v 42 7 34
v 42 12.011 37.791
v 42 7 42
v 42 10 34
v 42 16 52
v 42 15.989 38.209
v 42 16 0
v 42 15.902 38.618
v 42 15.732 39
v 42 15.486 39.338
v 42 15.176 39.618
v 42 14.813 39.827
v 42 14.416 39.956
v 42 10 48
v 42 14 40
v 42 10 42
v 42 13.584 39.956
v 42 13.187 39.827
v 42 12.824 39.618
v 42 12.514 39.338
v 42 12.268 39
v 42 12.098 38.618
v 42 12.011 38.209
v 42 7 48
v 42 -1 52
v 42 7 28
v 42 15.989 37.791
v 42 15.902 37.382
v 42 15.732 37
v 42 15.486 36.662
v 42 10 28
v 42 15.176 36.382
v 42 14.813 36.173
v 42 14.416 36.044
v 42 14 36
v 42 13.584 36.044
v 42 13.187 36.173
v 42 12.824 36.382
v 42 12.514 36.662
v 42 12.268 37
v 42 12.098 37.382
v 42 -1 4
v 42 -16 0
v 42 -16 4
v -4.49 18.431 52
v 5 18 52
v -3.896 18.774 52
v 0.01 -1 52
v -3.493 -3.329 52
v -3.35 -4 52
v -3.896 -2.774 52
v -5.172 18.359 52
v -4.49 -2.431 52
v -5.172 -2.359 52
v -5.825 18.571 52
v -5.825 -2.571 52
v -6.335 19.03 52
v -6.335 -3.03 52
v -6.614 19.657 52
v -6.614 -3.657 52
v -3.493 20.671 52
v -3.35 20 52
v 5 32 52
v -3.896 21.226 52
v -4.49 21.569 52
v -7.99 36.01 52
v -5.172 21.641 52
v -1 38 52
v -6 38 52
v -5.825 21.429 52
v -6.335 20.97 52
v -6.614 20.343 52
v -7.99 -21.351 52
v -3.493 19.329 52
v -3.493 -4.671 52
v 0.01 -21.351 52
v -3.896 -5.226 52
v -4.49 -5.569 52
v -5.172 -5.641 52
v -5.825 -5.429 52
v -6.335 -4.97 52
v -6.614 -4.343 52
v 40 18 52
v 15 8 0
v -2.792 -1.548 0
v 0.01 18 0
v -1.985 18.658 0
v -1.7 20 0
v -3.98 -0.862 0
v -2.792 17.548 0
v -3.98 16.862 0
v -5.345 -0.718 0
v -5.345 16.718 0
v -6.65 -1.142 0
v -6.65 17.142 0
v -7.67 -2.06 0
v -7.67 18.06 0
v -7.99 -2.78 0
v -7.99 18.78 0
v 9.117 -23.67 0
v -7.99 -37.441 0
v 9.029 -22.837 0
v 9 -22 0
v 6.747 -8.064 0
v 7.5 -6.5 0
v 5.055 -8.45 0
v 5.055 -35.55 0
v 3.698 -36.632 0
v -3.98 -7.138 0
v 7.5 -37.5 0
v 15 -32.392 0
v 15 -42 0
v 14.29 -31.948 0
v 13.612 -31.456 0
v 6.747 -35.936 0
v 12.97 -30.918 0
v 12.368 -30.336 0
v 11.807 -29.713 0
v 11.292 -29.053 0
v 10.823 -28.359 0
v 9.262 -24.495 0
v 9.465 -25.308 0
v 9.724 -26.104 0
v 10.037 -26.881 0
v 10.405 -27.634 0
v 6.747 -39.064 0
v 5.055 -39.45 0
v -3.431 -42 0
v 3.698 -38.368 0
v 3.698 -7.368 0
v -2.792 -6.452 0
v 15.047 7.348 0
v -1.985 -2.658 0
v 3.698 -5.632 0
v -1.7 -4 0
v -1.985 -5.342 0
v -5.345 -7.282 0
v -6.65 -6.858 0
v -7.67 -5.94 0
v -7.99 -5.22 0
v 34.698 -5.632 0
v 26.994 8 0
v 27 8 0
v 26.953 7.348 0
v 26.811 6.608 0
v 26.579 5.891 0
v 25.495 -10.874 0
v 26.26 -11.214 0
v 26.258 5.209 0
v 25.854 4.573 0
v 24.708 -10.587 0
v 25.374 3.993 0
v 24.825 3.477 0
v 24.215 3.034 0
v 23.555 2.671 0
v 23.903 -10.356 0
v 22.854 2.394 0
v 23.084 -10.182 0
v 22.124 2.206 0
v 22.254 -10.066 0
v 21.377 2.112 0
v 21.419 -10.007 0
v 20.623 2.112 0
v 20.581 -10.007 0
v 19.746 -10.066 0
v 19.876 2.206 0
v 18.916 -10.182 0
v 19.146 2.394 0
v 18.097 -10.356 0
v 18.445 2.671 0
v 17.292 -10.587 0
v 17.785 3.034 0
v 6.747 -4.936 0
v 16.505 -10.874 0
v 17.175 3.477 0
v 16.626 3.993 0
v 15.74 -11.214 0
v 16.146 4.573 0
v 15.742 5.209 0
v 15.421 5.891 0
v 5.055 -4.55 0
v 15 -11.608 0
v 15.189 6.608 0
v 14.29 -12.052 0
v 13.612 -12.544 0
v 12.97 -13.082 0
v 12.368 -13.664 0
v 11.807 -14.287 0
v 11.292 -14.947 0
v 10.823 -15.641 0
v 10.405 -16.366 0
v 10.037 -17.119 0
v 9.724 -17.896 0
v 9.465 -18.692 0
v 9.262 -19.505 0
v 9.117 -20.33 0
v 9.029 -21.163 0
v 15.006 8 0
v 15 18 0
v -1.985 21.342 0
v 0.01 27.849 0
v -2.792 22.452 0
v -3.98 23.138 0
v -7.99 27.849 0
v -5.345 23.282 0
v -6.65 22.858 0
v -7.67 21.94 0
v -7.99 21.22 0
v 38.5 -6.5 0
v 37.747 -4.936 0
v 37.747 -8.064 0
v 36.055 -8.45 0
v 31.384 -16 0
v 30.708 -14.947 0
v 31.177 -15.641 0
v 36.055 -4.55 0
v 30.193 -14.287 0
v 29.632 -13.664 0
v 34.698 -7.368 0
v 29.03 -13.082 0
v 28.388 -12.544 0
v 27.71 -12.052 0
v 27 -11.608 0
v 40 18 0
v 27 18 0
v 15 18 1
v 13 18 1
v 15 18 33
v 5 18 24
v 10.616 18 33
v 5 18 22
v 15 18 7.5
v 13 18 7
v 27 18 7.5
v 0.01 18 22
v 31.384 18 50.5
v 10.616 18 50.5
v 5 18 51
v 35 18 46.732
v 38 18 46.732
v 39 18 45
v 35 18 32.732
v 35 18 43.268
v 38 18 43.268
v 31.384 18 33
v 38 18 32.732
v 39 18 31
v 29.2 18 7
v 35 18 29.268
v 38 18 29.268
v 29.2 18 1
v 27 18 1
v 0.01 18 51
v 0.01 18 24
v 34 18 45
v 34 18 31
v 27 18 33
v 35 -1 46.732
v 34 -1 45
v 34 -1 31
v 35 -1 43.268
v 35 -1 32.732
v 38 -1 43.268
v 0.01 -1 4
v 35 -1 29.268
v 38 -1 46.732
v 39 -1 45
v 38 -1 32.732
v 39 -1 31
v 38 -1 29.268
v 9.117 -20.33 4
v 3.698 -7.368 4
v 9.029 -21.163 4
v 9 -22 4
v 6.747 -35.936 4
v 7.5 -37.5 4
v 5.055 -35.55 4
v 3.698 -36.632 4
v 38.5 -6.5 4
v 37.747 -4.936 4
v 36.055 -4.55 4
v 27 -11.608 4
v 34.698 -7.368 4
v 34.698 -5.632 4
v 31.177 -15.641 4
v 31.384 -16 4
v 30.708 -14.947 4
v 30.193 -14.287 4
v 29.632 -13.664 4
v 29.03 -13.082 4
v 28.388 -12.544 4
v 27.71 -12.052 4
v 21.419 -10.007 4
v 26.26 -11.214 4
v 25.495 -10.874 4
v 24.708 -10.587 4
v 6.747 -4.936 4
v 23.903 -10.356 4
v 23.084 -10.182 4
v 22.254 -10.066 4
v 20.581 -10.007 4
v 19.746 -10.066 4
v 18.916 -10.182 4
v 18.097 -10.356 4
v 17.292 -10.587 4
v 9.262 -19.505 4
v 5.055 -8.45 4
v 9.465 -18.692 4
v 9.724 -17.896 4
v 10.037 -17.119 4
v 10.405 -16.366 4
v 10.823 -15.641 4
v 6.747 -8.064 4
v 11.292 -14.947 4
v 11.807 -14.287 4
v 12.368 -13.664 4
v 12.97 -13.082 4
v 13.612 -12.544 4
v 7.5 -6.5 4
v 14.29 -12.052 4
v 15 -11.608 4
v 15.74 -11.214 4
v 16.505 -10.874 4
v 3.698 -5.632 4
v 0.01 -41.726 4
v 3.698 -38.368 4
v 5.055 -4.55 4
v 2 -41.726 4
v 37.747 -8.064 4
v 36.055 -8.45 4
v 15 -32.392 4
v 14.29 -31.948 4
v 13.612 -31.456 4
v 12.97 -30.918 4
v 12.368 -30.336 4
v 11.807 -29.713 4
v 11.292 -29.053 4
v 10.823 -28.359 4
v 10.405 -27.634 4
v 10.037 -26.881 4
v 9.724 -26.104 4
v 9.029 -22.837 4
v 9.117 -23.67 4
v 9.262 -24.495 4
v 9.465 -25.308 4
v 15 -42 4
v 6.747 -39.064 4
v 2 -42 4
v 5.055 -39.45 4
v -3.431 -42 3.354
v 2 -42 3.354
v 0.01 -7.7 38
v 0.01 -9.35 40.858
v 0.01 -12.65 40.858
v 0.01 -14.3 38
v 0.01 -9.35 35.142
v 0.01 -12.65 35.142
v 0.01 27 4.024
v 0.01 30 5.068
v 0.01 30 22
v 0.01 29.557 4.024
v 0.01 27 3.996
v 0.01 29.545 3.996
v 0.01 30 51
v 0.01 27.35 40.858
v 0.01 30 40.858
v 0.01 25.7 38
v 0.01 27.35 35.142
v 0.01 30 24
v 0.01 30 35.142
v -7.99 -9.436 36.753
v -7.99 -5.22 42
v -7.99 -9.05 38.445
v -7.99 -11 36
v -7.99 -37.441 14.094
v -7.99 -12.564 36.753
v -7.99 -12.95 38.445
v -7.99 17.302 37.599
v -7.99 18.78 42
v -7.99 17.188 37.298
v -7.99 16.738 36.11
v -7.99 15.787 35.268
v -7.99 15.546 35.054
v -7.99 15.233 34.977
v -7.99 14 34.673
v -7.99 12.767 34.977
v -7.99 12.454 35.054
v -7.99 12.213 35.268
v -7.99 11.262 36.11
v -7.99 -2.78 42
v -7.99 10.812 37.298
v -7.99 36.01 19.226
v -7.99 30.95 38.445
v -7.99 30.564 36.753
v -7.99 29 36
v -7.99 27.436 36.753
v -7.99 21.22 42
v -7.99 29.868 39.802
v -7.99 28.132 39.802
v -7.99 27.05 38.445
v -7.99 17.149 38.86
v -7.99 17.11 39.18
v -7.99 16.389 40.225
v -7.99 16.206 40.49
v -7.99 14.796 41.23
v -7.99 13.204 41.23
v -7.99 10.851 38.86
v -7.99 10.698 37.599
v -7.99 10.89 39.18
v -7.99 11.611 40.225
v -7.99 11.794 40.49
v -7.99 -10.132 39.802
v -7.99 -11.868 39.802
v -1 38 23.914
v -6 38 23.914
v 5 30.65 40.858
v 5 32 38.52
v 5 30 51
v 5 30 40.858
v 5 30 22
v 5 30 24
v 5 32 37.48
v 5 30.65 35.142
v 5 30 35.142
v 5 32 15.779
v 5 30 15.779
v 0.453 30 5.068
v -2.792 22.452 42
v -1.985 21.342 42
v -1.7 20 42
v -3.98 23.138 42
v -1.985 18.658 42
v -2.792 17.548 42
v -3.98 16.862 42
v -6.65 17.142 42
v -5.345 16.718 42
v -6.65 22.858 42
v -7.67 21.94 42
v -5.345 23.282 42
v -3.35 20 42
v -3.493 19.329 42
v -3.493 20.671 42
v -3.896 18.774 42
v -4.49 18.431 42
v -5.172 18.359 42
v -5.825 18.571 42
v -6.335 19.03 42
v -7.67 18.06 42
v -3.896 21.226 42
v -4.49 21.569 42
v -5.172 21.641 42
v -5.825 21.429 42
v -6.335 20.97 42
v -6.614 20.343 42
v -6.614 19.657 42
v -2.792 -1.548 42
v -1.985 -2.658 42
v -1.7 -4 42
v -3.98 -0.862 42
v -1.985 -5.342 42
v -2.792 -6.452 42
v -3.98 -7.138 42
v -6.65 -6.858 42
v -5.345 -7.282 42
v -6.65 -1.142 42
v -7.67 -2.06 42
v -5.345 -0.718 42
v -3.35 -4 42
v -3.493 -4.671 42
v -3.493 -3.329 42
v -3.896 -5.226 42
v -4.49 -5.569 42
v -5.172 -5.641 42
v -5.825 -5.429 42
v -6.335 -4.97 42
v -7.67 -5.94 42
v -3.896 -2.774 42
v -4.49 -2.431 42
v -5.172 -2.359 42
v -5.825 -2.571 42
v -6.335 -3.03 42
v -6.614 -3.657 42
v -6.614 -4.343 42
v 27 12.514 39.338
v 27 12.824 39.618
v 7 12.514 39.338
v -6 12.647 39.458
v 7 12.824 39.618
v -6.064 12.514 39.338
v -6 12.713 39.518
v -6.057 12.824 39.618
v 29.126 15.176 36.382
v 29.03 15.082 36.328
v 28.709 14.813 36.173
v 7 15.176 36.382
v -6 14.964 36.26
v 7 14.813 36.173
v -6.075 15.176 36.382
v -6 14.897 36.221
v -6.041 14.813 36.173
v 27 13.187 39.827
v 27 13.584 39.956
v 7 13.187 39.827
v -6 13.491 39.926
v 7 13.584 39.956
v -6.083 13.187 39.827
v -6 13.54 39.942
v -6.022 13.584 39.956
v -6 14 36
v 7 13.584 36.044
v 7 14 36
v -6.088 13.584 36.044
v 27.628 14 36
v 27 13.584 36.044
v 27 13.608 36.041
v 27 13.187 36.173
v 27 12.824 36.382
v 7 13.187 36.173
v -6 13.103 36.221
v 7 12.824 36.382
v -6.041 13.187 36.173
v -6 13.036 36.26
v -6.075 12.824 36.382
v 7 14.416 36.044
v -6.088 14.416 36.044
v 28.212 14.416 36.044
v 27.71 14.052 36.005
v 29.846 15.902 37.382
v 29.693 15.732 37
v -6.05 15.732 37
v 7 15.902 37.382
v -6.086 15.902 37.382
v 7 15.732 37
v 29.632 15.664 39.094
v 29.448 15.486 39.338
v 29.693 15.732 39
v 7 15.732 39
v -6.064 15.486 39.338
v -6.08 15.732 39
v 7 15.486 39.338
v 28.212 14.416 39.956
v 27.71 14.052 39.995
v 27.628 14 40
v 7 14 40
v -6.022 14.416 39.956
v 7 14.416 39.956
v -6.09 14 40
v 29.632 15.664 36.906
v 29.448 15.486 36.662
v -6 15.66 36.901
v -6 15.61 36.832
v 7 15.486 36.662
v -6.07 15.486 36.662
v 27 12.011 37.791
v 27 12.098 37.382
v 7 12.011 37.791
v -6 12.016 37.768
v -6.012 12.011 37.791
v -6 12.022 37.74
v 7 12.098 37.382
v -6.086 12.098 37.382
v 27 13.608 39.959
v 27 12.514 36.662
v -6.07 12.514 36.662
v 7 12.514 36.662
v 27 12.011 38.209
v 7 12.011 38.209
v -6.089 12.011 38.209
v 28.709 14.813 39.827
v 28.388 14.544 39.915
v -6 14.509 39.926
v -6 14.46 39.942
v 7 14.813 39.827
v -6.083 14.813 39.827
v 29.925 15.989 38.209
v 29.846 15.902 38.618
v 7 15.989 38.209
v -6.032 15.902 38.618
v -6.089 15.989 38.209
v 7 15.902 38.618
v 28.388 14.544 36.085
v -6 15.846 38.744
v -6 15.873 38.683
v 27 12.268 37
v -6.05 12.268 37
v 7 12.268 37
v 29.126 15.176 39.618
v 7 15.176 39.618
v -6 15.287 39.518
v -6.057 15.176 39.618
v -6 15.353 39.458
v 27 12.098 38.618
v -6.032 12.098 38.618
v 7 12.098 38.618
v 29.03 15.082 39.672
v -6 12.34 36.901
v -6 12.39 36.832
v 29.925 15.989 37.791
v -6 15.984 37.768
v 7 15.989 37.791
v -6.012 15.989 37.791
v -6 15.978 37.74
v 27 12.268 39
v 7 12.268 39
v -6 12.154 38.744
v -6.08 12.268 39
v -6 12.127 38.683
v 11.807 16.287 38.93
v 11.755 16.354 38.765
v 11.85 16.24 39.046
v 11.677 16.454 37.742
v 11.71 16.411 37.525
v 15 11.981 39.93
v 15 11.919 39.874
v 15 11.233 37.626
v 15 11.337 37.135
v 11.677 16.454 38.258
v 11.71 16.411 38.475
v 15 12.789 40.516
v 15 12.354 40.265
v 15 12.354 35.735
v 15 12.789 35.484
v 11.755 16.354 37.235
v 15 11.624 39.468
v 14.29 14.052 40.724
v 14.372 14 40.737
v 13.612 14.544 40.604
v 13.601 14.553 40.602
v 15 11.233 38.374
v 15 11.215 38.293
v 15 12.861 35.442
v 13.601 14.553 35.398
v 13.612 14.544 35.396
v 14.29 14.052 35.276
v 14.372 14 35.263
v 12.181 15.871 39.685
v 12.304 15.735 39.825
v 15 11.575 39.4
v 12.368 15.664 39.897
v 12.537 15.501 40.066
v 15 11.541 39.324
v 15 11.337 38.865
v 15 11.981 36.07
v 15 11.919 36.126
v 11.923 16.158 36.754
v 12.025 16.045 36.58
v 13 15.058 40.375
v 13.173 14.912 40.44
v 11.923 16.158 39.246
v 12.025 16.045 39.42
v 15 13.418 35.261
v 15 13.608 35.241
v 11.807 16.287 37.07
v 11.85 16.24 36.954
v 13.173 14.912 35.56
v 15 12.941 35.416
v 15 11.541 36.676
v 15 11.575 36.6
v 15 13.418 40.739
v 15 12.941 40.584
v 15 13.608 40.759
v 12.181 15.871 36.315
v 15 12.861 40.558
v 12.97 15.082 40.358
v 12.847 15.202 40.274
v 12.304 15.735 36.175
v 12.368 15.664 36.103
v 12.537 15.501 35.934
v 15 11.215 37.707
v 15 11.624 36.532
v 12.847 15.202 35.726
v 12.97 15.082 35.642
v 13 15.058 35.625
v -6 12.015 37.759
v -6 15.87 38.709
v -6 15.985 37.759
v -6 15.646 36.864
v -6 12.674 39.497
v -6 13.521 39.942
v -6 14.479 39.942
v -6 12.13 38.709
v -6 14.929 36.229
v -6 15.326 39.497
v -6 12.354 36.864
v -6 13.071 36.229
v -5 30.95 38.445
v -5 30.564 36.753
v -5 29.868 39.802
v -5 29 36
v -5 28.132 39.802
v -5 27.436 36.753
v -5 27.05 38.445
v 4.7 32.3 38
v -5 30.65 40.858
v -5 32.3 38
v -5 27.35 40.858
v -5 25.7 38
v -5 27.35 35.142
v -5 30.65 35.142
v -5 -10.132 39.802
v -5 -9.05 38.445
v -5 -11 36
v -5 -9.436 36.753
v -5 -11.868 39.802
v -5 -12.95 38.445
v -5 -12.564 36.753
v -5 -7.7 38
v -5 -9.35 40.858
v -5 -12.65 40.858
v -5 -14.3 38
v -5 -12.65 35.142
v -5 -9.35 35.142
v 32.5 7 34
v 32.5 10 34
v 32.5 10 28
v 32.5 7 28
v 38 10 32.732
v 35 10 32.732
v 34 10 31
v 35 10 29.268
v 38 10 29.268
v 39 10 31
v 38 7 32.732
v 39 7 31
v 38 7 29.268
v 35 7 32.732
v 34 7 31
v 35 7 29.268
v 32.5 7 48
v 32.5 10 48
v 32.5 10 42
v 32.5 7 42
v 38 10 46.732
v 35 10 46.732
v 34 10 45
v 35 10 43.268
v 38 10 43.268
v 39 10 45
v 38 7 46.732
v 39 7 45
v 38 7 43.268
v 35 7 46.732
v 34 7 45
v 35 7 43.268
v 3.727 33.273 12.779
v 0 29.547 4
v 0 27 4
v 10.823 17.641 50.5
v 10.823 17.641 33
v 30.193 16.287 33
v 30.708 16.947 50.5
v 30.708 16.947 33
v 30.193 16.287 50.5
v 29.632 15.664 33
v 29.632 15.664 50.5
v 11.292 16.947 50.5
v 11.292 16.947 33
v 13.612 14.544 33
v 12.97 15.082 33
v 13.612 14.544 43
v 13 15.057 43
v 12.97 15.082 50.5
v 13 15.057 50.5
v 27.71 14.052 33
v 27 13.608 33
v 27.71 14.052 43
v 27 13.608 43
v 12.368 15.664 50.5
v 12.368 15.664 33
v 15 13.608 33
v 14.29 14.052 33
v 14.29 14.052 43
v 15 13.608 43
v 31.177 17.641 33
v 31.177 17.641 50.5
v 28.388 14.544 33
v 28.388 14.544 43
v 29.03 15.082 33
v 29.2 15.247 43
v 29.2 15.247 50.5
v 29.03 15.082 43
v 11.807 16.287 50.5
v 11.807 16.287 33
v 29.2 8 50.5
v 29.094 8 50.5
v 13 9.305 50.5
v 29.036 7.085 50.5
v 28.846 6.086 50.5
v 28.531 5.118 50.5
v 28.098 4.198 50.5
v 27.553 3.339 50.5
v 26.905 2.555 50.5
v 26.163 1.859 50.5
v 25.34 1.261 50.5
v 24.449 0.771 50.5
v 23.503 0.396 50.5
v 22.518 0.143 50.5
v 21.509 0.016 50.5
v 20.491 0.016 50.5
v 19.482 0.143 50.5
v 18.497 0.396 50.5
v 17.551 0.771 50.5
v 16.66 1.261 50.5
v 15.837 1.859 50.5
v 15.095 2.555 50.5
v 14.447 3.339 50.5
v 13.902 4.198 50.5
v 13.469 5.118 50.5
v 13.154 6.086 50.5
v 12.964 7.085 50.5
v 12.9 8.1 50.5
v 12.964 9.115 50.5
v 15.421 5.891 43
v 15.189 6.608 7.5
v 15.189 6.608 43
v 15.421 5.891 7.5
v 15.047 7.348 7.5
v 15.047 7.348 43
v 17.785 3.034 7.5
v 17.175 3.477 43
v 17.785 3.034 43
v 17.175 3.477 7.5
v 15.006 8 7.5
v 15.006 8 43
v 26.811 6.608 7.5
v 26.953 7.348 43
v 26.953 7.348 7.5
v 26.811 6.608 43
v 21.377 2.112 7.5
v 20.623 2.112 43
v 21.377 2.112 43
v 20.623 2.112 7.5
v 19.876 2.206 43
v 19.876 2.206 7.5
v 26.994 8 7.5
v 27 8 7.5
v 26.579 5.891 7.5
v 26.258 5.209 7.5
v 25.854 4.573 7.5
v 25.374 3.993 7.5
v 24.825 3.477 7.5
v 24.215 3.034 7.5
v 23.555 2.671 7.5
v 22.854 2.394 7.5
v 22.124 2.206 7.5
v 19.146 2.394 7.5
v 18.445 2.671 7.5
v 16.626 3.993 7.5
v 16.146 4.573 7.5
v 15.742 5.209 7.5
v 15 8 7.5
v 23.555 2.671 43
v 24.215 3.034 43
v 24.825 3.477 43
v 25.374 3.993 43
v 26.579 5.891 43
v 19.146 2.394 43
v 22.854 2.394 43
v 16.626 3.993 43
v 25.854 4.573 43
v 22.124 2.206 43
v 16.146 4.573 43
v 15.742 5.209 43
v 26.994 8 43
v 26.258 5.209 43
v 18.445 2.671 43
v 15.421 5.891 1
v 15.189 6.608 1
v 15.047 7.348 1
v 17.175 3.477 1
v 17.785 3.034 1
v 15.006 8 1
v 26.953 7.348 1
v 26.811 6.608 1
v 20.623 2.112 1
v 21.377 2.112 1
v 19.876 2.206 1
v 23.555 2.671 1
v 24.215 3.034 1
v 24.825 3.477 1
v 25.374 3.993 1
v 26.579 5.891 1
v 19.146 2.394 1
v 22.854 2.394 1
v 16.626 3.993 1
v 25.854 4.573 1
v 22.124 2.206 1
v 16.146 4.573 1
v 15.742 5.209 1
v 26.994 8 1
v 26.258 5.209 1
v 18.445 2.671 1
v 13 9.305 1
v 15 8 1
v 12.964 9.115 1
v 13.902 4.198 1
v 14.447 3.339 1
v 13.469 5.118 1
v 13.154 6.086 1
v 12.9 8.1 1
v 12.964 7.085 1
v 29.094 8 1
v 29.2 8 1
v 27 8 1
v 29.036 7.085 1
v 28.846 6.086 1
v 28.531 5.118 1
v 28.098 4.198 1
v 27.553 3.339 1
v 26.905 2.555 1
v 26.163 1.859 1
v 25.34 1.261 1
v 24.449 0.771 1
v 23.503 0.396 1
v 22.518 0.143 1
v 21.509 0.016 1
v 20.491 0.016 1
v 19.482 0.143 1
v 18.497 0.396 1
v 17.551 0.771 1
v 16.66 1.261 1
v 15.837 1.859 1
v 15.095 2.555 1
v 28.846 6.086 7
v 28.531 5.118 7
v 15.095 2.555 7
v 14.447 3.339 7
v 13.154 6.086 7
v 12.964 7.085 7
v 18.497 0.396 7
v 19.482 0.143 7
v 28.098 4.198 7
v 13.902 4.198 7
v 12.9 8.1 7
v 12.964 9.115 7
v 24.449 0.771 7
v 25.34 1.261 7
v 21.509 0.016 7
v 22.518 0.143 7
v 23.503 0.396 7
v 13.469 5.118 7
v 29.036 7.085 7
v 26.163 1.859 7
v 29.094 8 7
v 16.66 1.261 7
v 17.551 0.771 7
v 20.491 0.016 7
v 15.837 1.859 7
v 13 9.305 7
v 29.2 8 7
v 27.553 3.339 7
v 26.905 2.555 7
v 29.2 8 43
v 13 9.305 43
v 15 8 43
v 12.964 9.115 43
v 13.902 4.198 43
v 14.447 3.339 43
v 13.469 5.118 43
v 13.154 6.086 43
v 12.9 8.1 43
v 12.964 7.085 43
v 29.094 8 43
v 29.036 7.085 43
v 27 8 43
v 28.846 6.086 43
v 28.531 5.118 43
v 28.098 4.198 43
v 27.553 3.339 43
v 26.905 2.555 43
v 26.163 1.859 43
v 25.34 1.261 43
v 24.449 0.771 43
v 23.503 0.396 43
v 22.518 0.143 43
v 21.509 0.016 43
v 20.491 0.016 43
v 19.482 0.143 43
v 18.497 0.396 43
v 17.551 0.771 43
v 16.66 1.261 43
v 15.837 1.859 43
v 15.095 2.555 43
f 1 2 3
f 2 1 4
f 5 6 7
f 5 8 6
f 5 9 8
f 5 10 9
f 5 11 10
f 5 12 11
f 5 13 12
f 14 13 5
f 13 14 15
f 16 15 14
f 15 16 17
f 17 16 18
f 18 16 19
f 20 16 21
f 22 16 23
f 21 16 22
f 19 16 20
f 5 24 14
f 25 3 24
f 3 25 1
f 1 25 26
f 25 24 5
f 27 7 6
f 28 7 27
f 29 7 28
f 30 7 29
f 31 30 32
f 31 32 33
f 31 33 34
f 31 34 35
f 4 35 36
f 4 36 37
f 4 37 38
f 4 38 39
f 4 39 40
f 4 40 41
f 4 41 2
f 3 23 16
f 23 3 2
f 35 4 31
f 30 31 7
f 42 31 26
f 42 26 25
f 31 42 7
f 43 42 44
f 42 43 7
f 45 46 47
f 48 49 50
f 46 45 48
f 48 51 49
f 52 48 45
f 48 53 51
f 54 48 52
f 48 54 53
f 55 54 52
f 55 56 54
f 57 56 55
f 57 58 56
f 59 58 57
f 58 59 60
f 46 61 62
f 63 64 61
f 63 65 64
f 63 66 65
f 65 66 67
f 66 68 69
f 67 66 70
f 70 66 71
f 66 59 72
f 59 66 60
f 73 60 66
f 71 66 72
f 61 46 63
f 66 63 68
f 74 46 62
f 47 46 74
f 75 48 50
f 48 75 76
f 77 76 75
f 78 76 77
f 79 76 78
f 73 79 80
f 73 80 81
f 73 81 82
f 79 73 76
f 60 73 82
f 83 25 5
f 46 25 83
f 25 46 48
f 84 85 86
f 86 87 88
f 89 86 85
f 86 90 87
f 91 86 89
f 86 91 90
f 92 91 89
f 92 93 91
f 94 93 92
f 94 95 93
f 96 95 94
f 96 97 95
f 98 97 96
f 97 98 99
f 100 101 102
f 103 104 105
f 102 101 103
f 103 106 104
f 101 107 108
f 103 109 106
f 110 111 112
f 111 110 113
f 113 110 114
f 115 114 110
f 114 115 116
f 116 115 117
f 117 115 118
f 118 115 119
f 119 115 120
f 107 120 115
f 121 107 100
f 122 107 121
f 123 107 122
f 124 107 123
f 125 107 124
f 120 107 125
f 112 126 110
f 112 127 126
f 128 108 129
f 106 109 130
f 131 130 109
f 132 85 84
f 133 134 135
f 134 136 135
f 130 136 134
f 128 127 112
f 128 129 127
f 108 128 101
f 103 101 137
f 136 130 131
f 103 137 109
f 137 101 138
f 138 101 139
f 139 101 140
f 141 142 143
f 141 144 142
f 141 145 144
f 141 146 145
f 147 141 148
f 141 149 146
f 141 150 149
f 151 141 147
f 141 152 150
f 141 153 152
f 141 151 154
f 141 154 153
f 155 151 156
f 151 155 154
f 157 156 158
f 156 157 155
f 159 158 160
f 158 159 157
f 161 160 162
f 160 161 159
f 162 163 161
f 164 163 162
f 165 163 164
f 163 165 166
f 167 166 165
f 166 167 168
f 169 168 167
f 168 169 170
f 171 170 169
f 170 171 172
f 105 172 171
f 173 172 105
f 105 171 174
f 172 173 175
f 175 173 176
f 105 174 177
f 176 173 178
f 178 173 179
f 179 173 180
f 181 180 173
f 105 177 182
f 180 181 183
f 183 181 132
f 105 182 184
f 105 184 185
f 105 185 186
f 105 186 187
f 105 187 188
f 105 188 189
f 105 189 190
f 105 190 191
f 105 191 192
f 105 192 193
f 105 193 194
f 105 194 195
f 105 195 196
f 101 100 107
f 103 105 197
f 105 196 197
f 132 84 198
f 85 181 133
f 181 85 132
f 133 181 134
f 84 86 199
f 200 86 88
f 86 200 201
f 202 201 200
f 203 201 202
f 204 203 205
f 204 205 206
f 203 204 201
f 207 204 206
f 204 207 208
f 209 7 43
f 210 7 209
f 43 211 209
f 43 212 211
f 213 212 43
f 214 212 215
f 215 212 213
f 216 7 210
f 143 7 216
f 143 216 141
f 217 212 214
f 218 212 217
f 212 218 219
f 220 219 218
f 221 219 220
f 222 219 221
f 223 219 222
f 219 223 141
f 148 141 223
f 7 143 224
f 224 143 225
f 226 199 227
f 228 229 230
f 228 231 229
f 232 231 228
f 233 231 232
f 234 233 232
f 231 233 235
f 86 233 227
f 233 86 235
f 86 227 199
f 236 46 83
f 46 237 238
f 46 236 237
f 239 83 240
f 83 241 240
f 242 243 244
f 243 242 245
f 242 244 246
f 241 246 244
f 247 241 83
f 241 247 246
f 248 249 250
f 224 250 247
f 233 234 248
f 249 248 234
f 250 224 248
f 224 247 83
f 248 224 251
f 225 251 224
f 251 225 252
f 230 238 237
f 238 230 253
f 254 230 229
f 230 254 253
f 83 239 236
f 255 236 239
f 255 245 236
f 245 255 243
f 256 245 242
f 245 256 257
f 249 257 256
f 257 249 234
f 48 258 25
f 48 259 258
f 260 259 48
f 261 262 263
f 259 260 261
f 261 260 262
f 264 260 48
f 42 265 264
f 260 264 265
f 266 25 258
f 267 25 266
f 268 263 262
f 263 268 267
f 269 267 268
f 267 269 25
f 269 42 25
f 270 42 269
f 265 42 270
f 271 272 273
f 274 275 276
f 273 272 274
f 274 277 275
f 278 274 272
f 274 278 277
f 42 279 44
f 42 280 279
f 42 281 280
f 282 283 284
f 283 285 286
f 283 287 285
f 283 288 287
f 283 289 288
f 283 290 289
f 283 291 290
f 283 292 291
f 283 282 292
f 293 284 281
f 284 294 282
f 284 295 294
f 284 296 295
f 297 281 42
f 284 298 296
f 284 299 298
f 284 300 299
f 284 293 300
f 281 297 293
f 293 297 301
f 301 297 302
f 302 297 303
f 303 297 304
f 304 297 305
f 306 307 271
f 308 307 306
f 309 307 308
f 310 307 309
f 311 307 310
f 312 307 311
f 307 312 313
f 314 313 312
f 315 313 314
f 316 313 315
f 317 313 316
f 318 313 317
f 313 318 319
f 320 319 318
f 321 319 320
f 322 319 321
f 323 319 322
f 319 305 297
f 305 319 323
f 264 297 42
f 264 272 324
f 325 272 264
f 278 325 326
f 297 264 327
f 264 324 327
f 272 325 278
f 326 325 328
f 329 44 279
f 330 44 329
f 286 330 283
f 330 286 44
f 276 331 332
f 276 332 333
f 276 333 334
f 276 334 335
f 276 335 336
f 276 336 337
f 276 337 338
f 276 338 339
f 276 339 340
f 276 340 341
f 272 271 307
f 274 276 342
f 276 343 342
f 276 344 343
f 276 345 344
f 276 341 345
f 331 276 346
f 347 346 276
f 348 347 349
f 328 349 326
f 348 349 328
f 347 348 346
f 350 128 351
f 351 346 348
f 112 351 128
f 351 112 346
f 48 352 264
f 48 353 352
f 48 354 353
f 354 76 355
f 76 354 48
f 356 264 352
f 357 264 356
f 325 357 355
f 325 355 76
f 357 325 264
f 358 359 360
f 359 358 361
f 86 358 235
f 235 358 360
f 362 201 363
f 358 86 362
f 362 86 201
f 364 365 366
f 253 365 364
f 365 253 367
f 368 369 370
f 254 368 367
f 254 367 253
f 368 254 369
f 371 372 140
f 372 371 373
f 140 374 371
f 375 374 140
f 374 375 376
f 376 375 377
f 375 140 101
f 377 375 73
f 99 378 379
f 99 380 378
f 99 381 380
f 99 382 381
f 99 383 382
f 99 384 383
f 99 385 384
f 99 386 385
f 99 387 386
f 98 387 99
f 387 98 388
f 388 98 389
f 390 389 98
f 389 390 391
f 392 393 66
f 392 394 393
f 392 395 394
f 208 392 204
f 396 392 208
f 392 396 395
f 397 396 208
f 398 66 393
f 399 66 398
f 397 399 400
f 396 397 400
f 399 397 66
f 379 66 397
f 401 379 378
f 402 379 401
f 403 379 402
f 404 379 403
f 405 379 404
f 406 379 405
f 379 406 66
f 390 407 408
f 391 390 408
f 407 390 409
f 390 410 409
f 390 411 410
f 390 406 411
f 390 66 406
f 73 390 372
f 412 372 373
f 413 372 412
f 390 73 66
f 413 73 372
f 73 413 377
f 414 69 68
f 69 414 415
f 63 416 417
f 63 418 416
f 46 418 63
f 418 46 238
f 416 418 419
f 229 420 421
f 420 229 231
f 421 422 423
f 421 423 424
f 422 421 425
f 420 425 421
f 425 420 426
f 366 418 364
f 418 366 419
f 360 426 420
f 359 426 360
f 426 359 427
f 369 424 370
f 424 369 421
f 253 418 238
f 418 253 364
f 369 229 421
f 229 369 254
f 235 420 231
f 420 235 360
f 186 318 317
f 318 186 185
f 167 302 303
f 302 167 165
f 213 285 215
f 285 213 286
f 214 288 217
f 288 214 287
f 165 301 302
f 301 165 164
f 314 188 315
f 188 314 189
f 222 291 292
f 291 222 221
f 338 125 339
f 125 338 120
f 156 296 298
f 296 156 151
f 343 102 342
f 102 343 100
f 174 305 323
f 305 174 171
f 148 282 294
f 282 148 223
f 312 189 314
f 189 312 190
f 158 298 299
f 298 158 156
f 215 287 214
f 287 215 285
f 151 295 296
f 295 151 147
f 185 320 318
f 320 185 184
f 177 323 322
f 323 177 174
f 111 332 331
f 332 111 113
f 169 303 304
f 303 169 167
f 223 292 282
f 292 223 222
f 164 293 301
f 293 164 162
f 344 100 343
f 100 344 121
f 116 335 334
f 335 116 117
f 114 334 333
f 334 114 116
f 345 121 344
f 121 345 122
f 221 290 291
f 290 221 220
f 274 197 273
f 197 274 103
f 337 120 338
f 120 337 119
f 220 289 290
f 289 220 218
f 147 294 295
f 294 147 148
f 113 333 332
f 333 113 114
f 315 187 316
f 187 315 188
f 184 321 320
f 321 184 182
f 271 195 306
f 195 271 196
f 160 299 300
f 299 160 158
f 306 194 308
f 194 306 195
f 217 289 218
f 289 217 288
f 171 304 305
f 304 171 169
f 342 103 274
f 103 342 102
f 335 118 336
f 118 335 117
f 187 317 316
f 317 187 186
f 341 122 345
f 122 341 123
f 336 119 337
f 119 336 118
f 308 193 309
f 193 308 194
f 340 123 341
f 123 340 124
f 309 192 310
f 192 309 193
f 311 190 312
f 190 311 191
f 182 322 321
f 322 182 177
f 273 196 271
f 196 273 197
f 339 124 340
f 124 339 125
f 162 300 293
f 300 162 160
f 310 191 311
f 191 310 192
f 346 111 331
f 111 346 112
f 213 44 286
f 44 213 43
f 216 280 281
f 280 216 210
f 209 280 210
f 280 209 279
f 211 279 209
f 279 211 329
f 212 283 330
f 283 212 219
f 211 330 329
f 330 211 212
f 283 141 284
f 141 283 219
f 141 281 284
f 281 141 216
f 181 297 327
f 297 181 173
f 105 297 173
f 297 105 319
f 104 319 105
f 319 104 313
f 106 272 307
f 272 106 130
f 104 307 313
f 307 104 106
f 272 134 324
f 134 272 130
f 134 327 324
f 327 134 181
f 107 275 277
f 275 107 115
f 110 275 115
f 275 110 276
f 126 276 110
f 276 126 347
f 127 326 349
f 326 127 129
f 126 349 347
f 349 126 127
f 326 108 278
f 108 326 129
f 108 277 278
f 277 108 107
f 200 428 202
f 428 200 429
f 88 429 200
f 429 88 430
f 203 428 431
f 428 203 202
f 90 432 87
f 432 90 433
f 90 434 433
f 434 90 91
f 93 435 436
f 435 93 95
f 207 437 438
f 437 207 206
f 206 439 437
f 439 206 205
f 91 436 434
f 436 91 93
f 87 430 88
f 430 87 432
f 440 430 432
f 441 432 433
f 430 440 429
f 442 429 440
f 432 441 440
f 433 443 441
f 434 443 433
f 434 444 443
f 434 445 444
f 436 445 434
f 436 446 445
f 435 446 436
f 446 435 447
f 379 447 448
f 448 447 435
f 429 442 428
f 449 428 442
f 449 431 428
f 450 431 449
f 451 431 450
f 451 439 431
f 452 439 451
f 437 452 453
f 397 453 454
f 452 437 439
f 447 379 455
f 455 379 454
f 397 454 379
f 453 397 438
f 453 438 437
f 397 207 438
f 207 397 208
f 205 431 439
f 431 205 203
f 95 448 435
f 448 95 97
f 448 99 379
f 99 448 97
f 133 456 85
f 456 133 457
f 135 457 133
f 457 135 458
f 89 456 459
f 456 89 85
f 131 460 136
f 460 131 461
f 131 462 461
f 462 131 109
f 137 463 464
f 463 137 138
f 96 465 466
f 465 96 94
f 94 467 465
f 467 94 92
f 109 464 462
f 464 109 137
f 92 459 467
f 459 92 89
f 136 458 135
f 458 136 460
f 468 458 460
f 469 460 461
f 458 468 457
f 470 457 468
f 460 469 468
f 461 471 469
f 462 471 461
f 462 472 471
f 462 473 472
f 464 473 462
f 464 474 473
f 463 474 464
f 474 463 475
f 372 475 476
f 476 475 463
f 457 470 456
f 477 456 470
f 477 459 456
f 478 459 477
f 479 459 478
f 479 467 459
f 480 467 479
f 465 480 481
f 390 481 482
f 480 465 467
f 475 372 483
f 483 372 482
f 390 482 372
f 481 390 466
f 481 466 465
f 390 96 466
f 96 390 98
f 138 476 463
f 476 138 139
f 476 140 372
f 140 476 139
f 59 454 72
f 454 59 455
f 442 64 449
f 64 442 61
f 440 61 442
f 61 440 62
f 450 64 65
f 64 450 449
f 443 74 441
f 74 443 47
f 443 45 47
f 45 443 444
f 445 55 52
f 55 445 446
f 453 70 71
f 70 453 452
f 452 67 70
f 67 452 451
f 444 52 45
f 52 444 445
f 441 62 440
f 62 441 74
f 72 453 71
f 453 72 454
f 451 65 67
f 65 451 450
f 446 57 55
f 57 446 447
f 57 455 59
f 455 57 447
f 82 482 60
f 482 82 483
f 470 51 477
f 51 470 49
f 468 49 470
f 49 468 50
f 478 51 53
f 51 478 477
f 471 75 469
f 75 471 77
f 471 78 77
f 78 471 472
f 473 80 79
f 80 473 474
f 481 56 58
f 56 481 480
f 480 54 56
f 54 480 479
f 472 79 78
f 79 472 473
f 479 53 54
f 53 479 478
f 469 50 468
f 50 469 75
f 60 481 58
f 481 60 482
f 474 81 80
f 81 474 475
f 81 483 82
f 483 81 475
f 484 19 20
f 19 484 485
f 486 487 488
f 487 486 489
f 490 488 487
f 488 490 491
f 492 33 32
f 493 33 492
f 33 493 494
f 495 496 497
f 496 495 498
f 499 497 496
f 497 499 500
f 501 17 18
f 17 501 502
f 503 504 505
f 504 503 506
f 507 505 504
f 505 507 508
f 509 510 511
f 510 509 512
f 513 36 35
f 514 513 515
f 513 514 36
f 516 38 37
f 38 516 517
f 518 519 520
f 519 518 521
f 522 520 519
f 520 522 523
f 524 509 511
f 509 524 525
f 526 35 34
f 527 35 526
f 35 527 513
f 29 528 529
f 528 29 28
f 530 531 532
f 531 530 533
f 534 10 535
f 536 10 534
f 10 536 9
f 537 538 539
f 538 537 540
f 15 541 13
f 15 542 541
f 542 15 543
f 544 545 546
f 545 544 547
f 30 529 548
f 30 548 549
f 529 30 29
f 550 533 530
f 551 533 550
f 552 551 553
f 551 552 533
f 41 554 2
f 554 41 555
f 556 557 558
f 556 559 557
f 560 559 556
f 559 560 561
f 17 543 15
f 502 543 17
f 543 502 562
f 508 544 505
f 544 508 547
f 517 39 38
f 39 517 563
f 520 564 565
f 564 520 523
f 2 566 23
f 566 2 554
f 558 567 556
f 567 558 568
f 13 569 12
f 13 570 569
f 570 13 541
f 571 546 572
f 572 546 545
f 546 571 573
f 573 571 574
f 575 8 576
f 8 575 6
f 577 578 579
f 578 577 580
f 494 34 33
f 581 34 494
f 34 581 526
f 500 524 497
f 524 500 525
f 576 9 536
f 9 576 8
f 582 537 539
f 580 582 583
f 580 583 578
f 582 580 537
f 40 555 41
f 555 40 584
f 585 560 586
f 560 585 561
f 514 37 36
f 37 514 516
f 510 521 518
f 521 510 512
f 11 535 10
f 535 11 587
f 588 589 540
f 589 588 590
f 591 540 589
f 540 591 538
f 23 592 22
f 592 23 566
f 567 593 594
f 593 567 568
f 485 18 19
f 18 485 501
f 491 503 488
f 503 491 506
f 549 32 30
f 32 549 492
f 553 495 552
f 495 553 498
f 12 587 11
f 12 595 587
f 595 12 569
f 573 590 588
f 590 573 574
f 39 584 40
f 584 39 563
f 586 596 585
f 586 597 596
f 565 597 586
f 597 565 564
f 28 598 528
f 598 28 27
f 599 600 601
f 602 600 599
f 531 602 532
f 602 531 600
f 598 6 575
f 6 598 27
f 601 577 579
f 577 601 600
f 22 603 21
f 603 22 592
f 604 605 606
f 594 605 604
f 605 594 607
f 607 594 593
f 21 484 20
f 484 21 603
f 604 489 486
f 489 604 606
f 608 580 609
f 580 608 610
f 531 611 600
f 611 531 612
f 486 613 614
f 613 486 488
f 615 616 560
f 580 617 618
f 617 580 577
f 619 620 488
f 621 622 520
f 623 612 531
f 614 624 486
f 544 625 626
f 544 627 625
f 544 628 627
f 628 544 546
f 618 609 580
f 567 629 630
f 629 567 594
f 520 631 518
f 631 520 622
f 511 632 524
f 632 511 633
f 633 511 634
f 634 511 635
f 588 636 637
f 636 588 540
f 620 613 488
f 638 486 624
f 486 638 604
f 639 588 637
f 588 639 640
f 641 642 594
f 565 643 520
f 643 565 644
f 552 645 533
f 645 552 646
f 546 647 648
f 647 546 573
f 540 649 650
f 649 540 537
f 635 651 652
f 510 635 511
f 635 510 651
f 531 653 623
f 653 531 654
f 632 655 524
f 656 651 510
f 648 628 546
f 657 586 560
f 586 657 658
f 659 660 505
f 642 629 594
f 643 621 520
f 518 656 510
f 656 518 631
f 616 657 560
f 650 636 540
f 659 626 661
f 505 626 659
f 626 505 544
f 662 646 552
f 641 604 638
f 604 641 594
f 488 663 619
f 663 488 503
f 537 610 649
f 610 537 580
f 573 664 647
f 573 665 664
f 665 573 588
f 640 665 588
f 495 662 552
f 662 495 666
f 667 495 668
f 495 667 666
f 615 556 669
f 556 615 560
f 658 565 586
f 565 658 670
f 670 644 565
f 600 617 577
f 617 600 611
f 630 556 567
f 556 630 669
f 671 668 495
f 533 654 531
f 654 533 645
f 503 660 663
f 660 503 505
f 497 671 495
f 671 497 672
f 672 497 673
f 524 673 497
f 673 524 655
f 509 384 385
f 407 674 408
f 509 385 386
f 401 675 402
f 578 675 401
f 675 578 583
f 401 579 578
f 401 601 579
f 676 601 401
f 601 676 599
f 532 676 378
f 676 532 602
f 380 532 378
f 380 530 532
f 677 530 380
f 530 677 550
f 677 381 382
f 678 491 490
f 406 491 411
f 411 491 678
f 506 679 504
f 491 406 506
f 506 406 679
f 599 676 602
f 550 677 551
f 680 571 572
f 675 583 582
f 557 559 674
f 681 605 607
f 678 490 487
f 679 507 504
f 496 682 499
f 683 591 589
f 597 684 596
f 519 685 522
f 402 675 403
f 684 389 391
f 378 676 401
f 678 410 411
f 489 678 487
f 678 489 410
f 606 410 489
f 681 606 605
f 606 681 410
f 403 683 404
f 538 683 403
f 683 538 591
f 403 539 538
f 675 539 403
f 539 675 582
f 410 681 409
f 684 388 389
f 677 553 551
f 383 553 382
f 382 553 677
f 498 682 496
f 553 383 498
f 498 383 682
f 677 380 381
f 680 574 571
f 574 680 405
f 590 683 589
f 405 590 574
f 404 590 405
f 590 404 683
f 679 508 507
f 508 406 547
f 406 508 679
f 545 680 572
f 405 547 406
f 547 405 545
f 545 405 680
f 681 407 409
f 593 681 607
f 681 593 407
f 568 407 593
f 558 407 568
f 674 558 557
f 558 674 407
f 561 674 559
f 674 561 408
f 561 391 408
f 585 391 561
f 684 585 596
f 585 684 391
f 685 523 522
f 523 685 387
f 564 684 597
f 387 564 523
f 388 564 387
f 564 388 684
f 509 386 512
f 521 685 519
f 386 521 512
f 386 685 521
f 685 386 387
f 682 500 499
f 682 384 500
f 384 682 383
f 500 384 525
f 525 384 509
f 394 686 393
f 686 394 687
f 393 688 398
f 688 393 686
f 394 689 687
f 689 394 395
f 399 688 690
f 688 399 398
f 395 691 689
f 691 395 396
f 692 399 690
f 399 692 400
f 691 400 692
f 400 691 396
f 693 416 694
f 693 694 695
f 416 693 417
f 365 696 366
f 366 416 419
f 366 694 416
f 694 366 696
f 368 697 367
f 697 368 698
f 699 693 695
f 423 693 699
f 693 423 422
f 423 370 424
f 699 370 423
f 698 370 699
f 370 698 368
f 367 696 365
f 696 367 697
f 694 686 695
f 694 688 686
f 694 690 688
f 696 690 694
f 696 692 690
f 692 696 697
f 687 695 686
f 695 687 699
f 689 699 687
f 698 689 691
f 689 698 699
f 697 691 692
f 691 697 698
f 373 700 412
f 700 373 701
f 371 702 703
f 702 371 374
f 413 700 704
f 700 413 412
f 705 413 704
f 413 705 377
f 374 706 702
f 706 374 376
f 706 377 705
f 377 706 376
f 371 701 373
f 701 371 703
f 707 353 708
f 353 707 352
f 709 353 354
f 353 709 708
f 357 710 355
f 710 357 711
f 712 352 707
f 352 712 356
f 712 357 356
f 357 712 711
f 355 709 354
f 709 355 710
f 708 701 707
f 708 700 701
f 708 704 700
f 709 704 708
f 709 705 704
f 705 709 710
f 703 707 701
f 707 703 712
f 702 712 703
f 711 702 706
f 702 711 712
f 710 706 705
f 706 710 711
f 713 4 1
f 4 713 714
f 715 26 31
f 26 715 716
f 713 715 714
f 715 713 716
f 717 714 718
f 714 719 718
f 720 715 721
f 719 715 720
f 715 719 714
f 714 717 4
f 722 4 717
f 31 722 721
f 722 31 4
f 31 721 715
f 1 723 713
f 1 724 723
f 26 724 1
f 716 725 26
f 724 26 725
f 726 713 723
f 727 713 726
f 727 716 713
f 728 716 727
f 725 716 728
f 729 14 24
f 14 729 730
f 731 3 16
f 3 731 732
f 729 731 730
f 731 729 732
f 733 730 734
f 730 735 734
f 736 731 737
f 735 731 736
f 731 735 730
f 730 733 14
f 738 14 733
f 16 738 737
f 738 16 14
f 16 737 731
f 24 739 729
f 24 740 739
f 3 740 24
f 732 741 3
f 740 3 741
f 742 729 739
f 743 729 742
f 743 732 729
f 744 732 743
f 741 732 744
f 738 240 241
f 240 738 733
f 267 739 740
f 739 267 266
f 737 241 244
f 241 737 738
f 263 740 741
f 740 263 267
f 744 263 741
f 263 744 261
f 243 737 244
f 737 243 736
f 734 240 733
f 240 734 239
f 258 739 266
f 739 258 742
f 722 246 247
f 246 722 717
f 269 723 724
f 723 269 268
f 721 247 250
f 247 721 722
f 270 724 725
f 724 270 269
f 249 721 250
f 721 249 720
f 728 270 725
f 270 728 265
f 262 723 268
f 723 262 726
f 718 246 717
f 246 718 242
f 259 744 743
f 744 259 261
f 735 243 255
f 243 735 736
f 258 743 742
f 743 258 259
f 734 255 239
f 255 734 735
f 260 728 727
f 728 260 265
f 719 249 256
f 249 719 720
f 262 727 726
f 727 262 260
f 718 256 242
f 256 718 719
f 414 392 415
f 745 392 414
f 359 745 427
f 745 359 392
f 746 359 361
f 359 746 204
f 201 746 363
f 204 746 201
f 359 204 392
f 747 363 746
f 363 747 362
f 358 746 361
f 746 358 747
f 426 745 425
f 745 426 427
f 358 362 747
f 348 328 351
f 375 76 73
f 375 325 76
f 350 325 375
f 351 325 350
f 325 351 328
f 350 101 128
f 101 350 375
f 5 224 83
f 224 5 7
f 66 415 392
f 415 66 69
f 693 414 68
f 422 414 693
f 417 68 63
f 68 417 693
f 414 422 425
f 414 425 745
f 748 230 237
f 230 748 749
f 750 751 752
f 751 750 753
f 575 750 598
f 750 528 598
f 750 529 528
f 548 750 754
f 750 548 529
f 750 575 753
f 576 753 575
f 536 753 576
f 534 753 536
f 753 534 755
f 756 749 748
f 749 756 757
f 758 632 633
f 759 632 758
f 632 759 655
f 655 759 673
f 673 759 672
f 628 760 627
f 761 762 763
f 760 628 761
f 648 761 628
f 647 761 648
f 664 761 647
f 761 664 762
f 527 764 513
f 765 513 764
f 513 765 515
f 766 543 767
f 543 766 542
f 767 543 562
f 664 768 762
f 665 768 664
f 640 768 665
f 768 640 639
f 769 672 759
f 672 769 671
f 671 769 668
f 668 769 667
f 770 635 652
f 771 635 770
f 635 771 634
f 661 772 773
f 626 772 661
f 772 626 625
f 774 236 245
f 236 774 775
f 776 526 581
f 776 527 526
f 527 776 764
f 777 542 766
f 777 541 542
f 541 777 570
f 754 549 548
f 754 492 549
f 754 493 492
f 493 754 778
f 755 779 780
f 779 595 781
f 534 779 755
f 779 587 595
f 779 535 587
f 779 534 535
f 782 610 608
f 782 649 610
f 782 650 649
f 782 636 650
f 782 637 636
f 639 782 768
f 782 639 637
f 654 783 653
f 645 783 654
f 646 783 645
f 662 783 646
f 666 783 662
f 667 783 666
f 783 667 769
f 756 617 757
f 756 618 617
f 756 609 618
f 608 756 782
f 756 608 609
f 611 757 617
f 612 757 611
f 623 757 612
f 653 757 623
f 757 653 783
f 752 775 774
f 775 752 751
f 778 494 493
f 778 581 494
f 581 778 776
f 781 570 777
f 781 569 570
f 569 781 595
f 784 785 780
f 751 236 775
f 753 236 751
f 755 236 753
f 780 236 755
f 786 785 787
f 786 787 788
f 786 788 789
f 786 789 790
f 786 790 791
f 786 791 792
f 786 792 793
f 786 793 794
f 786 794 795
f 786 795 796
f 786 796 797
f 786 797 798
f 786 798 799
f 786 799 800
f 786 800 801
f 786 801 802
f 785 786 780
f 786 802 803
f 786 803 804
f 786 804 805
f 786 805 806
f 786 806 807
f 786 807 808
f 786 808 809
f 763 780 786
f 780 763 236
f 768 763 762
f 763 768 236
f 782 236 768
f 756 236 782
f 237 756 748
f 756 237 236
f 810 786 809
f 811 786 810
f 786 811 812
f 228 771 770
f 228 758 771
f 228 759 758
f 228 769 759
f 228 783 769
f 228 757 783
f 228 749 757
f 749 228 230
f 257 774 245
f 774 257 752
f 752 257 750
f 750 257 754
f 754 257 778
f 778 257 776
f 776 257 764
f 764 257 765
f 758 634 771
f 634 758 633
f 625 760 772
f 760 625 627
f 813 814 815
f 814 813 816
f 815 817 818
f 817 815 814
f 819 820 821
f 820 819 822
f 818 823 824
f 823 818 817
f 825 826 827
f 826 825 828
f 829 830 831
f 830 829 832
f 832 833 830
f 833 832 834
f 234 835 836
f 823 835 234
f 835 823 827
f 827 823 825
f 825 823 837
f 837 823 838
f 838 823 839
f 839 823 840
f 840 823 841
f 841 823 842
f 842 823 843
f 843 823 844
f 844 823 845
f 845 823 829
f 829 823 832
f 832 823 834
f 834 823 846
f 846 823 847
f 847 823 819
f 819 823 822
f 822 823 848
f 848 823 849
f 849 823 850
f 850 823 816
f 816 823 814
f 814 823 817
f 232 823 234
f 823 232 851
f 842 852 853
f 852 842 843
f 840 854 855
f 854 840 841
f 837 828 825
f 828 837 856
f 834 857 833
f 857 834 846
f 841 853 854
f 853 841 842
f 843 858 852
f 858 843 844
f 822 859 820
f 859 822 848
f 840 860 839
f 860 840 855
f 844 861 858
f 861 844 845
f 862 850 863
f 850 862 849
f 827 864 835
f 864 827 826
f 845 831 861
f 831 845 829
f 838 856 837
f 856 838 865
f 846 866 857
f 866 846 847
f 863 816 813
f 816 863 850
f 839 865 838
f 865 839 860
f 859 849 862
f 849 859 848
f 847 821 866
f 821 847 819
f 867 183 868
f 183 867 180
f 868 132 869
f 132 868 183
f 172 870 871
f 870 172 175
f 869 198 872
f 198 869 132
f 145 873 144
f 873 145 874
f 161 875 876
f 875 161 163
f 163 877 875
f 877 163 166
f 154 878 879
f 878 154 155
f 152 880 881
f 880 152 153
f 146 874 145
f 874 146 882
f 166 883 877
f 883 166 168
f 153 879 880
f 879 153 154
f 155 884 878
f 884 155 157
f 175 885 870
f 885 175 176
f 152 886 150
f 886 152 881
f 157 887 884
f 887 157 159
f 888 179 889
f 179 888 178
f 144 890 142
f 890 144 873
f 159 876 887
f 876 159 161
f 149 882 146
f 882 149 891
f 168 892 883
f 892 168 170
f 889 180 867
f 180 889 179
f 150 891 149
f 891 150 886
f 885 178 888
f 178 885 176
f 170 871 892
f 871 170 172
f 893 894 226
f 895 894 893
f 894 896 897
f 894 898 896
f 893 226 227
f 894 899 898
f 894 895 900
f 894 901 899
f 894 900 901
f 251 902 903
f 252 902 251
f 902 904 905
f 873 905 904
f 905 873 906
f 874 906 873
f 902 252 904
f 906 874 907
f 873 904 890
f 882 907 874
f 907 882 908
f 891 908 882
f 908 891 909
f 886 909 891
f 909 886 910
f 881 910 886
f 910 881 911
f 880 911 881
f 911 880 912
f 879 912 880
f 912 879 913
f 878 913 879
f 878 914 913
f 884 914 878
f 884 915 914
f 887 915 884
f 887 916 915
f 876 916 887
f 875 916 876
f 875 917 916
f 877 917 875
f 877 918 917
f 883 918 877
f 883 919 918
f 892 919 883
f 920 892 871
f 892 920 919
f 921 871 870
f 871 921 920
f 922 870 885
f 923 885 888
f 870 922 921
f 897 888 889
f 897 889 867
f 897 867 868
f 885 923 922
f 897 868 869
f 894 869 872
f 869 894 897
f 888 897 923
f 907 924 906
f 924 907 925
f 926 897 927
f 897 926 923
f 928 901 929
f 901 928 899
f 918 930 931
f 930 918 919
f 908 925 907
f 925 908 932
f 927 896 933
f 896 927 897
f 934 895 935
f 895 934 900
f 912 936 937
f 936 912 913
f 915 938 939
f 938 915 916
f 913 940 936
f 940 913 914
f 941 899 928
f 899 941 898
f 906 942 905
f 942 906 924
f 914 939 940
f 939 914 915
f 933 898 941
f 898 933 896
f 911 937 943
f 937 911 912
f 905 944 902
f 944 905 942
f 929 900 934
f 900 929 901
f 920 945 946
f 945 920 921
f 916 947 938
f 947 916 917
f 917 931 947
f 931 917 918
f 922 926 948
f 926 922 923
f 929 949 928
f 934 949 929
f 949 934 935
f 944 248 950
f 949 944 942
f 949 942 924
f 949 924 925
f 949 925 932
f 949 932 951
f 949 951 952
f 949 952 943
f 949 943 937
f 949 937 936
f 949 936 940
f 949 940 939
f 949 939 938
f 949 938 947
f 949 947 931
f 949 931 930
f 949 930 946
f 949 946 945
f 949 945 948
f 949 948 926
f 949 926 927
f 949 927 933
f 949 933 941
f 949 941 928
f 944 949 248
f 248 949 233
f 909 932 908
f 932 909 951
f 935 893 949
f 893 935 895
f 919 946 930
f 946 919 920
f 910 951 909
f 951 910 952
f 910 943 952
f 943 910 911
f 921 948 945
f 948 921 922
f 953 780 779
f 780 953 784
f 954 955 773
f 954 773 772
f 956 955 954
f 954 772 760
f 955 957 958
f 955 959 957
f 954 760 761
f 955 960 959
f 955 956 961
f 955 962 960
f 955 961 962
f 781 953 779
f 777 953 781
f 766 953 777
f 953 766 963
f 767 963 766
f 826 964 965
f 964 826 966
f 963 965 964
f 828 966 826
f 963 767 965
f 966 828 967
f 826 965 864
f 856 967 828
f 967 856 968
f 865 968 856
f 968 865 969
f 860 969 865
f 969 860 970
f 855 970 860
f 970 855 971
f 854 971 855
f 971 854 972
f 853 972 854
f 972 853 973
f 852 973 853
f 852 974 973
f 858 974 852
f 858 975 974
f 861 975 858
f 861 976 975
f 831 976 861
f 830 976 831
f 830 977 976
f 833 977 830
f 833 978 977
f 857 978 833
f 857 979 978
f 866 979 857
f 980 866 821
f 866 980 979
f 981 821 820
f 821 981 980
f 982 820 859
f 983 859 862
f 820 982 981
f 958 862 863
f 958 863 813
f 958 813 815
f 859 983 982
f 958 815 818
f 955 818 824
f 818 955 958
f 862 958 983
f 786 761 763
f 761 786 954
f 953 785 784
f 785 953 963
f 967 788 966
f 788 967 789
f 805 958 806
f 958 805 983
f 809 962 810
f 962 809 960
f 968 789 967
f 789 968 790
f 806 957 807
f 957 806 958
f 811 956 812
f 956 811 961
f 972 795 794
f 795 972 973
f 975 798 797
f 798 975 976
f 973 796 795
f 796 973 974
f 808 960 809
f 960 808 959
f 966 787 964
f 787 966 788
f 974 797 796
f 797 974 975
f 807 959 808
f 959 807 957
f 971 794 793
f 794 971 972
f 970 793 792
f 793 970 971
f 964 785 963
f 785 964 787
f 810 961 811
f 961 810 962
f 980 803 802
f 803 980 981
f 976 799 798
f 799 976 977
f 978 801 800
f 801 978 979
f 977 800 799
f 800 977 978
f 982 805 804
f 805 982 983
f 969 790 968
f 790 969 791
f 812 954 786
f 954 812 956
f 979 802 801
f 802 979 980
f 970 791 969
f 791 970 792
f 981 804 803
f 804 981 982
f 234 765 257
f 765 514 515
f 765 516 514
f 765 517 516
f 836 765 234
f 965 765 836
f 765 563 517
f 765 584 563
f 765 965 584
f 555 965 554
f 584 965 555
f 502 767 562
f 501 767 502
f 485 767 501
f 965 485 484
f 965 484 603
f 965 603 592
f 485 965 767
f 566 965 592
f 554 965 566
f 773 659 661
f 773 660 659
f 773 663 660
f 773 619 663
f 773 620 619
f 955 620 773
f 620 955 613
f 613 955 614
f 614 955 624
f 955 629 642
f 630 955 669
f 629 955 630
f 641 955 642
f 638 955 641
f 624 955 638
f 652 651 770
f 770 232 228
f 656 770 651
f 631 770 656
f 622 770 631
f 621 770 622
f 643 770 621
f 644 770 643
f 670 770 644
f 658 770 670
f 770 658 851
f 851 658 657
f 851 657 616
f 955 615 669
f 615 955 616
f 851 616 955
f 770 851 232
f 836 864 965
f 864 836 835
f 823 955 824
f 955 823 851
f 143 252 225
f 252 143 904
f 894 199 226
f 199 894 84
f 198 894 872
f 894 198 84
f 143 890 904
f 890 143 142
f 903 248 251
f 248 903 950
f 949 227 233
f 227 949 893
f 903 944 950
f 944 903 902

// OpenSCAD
// PRUSA iteration3
// NEMA 17 extruder body
// GNU GPL v3
// Josef Průša <iam@josefprusa.cz>, Kliment Yanev and contributors
// http://www.reprap.org/wiki/Prusa_Mendel
// http://prusamendel.org

module nozzlemount(){
rotate([0,90,0]) cylinder(r=2, h=70, $fn=30);
translate([17,0,0]) rotate([0,90,0]) cylinder(r2=3,r1=2, h=10, $fn=30);
translate([1,0,0]) rotate([0,90,0]) cylinder(r1=4, r2=2, h=3);
translate([0,15,0]) rotate([0,90,0]) cylinder(r=2, h=70);
translate([10-5,15,0]) rotate([0,90,0]) rotate([0,0,30]) cylinder(r=3.3, h=70,$fn=6);
translate([0,-25,0]) rotate([0,90,0]) cylinder(r=2, h=70);
translate([10-5,-25,0]) rotate([0,90,0]) rotate([0,0,30])cylinder(r=3.3, h=70,$fn=6);
}


difference(){
union(){
translate([0,-1,0])cube([42,19,52]);
translate([0,-42,0]) cube([42,42+3,4]);
translate([-7.99,-42,0]) cube([8,80,52]);

translate([-1,30,0]) cube([6, 7, 52]);


translate([-1,15,51]) cube([6, 20, 1]);
translate([-1,15,22]) cube([6, 20, 2]);

}

//antiwarpagenation

translate([46,-91,-1])rotate([0,0,45])cube(40);
translate([-11,-91,-1])rotate([0,0,45])cube([40,40,60]);
translate([46,12,-1])rotate([0,0,45])cube([40,40,60]);
translate([-32,12,-1])rotate([0,0,45])cube([40,40,60]);
translate([6,31,-1])rotate([0,0,45])cube([40,40,60]);

// motor circle cut
translate([0,-1,0.5]){
translate([21,-21,-1]) cylinder(r=12, h=5, $fn=90);

 translate([15,-45,-1]) cube([30,30,5]);

translate([21+15.5,-21+15.5,-1]) cylinder(r=2, h=5);
translate([21+15.5,-21-15.5,-1]) cylinder(r=2, h=5);
translate([21-15.5,-21+15.5,-1]) cylinder(r=2, h=5);
translate([21-15.5,-21-15.5,-1]) cylinder(r=2, h=5);
}



// idler bearing cutout
translate([21,24,33]) cylinder(r=12, h=17.5, $fn=90);


translate([21,8.1,7.5]) cylinder(r=6, h=43, $fn=50);

translate([21,8.1,-1]) cylinder(r=6, h=3, $fn=50);
// Second filament drive bearing
translate([21,8.1,1]) cylinder(r=8.1, h=6, $fn=50);
// Second filament drive bearing insert cutout

translate([13,8,43]) cube([16.2,20,7.5]);


translate([21,8.1,-5+52-4]) cylinder(r=8.1, h=7.5, $fn=50);

translate([-6+21,8,7.5]) cube([12,12,40]);

translate([-6+21,8,-50+7]) cube([12,12,50]);


translate([13,8,1]) cube([16.2,20,6]);

//mounting to carriage
translate([-5,20,-28]){
translate([0,0,0])rotate([0,0,0])cylinder(r=3.3, h=70, $fn=15);
translate([0,0-24,0])rotate([0,0,0])cylinder(r=3.3, h=70, $fn=15);
translate([0,0,30])rotate([0,0,0])cylinder(r=3.3/2, h=70, $fn=15);
translate([0,0-24,30])rotate([0,0,0])cylinder(r=3.3/2, h=70, $fn=15);
}

// idler nuts and filament channels

translate([0,0,-2]){
translate([-10,2+8+4,52-12]) nozzlemount();
//translate([-10,2+8+4,52-12-25]) nozzlemount();

translate([32.5,7,52-12-7-3]) cube([15,3,6]);

translate([32.5,7,52-12-7-3+14]) cube([15,3,6]);


//translate([5+32,-1,52-12+7]) rotate([0,90,90]) rotate([0,0,30]) cylinder(r=3.3, h=10, $fn=6);
//translate([5+32,-1,52-12-7]) rotate([0,90,90]) rotate([0,0,30]) cylinder(r=3.3, h=10, $fn=6);



translate([5+32,-1,52-12+7]) rotate([0,90,90]) rotate([0,0,30]) cylinder(r=2, h=40, $fn=6);
translate([5+32,-1,52-12-7]) rotate([0,90,90]) rotate([0,0,30]) cylinder(r=2, h=40, $fn=6);
translate([5+31,-1,52-12+7]) rotate([0,90,90]) rotate([0,0,30]) cylinder(r=2, h=40, $fn=6);
translate([5+31,-1,52-12-7]) rotate([0,90,90]) rotate([0,0,30]) cylinder(r=2, h=40, $fn=6);


// pretty cutout
translate([-10,27,0]) rotate([-23,0,0]) cube([20,12,50]);
translate([0,27,6]) rotate([0,23,0]) cube([20,12,50]);

// pretty cutout
translate([-10,-66,0]) rotate([-23,0,0]) cube([12,20,90]);

}
}
